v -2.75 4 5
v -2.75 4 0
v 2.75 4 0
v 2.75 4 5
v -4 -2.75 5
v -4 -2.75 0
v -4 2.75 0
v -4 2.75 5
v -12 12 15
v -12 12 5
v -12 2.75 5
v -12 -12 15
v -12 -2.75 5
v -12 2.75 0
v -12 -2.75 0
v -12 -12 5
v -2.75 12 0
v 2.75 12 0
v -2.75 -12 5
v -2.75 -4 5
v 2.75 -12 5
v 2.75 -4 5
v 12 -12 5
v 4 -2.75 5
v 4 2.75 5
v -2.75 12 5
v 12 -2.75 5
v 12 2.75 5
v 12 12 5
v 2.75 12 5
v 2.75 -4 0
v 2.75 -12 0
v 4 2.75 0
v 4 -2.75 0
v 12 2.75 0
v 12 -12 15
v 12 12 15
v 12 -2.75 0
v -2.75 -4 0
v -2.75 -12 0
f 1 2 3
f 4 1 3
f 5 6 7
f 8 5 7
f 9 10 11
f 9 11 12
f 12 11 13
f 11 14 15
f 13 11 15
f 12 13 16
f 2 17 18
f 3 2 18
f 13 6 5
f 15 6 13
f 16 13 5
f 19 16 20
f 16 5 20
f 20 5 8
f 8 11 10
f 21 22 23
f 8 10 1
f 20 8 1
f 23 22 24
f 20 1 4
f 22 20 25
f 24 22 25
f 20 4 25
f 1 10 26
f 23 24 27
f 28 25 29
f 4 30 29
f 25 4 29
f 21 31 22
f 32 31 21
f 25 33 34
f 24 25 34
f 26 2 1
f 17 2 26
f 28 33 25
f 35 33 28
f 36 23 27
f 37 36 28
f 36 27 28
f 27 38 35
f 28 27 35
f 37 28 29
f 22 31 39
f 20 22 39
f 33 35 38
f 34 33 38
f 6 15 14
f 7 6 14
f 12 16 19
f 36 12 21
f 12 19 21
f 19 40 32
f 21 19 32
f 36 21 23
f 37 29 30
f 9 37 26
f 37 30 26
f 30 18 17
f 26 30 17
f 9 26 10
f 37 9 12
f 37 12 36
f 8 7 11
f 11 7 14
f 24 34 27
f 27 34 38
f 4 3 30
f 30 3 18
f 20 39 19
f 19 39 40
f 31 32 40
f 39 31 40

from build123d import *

# Parameters (mm, degrees)
F0_W     = 5.5
F0_H     = 8
F1_DEPTH = 5
F0_R     = 1
F2_COUNT = 4
F4_W     = 5.5
F4_H     = 8
F4_W_2   = 8
F4_H_2   = 5.5
F5_DEPTH = 10


with BuildPart() as f1:
    # F0 (on Top) → F1 (new body)
    with BuildSketch(Plane.XY):
        with Locations((0, 8)):
            Rectangle(F0_W, F0_H)
    extrude(amount=F1_DEPTH)


with BuildPart() as f1b:
    # F0 (on Top) → F1, piece 2 (new body)
    with BuildSketch(Plane.XY):
        Circle(F0_R)
    extrude(amount=F1_DEPTH)


with BuildPart() as f2_1:
    # F2: instance of F1
    add(f1.part.rotate(Axis((0, 0, 0), (0, 0, -1)), 1 * 360 / F2_COUNT))


with BuildPart() as f2_2:
    # F2: instance of F1
    add(f1.part.rotate(Axis((0, 0, 0), (0, 0, -1)), 2 * 360 / F2_COUNT))


with BuildPart() as f2_3:
    # F2: instance of F1
    add(f1.part.rotate(Axis((0, 0, 0), (0, 0, -1)), 3 * 360 / F2_COUNT))


with BuildPart() as f1_1:
    add(f1.part)

    add(f2_1.part)  # F5 merges F2_1

    add(f2_2.part)  # F5 merges F2_2

    add(f2_3.part)  # F5 merges F2_3
    # F4 (on face) → F5 (join)
    with BuildSketch(Plane.XY.offset(5)):
        with Locations((0, 8)):
            Rectangle(F4_W, F4_H)
        Polygon((12, 12), (2.75, 12), (2.75, 4), (-2.75, 4), (-2.75, 12), (-12, 12), (-12, 2.75), (-4, 2.75), (-4, -2.75), (-12, -2.75), (-12, -12), (-2.75, -12), (-2.75, -4), (2.75, -4), (2.75, -12), (12, -12), (12, -2.75), (4, -2.75), (4, 2.75), (12, 2.75), align=None)
        with Locations((8, 0)):
            Rectangle(F4_W_2, F4_H_2)
        with Locations((-8, 0)):
            Rectangle(F4_W_2, F4_H_2)
        with Locations((0, -8)):
            Rectangle(F4_W, F4_H)
    extrude(amount=F5_DEPTH)


solid = f1_1.part
